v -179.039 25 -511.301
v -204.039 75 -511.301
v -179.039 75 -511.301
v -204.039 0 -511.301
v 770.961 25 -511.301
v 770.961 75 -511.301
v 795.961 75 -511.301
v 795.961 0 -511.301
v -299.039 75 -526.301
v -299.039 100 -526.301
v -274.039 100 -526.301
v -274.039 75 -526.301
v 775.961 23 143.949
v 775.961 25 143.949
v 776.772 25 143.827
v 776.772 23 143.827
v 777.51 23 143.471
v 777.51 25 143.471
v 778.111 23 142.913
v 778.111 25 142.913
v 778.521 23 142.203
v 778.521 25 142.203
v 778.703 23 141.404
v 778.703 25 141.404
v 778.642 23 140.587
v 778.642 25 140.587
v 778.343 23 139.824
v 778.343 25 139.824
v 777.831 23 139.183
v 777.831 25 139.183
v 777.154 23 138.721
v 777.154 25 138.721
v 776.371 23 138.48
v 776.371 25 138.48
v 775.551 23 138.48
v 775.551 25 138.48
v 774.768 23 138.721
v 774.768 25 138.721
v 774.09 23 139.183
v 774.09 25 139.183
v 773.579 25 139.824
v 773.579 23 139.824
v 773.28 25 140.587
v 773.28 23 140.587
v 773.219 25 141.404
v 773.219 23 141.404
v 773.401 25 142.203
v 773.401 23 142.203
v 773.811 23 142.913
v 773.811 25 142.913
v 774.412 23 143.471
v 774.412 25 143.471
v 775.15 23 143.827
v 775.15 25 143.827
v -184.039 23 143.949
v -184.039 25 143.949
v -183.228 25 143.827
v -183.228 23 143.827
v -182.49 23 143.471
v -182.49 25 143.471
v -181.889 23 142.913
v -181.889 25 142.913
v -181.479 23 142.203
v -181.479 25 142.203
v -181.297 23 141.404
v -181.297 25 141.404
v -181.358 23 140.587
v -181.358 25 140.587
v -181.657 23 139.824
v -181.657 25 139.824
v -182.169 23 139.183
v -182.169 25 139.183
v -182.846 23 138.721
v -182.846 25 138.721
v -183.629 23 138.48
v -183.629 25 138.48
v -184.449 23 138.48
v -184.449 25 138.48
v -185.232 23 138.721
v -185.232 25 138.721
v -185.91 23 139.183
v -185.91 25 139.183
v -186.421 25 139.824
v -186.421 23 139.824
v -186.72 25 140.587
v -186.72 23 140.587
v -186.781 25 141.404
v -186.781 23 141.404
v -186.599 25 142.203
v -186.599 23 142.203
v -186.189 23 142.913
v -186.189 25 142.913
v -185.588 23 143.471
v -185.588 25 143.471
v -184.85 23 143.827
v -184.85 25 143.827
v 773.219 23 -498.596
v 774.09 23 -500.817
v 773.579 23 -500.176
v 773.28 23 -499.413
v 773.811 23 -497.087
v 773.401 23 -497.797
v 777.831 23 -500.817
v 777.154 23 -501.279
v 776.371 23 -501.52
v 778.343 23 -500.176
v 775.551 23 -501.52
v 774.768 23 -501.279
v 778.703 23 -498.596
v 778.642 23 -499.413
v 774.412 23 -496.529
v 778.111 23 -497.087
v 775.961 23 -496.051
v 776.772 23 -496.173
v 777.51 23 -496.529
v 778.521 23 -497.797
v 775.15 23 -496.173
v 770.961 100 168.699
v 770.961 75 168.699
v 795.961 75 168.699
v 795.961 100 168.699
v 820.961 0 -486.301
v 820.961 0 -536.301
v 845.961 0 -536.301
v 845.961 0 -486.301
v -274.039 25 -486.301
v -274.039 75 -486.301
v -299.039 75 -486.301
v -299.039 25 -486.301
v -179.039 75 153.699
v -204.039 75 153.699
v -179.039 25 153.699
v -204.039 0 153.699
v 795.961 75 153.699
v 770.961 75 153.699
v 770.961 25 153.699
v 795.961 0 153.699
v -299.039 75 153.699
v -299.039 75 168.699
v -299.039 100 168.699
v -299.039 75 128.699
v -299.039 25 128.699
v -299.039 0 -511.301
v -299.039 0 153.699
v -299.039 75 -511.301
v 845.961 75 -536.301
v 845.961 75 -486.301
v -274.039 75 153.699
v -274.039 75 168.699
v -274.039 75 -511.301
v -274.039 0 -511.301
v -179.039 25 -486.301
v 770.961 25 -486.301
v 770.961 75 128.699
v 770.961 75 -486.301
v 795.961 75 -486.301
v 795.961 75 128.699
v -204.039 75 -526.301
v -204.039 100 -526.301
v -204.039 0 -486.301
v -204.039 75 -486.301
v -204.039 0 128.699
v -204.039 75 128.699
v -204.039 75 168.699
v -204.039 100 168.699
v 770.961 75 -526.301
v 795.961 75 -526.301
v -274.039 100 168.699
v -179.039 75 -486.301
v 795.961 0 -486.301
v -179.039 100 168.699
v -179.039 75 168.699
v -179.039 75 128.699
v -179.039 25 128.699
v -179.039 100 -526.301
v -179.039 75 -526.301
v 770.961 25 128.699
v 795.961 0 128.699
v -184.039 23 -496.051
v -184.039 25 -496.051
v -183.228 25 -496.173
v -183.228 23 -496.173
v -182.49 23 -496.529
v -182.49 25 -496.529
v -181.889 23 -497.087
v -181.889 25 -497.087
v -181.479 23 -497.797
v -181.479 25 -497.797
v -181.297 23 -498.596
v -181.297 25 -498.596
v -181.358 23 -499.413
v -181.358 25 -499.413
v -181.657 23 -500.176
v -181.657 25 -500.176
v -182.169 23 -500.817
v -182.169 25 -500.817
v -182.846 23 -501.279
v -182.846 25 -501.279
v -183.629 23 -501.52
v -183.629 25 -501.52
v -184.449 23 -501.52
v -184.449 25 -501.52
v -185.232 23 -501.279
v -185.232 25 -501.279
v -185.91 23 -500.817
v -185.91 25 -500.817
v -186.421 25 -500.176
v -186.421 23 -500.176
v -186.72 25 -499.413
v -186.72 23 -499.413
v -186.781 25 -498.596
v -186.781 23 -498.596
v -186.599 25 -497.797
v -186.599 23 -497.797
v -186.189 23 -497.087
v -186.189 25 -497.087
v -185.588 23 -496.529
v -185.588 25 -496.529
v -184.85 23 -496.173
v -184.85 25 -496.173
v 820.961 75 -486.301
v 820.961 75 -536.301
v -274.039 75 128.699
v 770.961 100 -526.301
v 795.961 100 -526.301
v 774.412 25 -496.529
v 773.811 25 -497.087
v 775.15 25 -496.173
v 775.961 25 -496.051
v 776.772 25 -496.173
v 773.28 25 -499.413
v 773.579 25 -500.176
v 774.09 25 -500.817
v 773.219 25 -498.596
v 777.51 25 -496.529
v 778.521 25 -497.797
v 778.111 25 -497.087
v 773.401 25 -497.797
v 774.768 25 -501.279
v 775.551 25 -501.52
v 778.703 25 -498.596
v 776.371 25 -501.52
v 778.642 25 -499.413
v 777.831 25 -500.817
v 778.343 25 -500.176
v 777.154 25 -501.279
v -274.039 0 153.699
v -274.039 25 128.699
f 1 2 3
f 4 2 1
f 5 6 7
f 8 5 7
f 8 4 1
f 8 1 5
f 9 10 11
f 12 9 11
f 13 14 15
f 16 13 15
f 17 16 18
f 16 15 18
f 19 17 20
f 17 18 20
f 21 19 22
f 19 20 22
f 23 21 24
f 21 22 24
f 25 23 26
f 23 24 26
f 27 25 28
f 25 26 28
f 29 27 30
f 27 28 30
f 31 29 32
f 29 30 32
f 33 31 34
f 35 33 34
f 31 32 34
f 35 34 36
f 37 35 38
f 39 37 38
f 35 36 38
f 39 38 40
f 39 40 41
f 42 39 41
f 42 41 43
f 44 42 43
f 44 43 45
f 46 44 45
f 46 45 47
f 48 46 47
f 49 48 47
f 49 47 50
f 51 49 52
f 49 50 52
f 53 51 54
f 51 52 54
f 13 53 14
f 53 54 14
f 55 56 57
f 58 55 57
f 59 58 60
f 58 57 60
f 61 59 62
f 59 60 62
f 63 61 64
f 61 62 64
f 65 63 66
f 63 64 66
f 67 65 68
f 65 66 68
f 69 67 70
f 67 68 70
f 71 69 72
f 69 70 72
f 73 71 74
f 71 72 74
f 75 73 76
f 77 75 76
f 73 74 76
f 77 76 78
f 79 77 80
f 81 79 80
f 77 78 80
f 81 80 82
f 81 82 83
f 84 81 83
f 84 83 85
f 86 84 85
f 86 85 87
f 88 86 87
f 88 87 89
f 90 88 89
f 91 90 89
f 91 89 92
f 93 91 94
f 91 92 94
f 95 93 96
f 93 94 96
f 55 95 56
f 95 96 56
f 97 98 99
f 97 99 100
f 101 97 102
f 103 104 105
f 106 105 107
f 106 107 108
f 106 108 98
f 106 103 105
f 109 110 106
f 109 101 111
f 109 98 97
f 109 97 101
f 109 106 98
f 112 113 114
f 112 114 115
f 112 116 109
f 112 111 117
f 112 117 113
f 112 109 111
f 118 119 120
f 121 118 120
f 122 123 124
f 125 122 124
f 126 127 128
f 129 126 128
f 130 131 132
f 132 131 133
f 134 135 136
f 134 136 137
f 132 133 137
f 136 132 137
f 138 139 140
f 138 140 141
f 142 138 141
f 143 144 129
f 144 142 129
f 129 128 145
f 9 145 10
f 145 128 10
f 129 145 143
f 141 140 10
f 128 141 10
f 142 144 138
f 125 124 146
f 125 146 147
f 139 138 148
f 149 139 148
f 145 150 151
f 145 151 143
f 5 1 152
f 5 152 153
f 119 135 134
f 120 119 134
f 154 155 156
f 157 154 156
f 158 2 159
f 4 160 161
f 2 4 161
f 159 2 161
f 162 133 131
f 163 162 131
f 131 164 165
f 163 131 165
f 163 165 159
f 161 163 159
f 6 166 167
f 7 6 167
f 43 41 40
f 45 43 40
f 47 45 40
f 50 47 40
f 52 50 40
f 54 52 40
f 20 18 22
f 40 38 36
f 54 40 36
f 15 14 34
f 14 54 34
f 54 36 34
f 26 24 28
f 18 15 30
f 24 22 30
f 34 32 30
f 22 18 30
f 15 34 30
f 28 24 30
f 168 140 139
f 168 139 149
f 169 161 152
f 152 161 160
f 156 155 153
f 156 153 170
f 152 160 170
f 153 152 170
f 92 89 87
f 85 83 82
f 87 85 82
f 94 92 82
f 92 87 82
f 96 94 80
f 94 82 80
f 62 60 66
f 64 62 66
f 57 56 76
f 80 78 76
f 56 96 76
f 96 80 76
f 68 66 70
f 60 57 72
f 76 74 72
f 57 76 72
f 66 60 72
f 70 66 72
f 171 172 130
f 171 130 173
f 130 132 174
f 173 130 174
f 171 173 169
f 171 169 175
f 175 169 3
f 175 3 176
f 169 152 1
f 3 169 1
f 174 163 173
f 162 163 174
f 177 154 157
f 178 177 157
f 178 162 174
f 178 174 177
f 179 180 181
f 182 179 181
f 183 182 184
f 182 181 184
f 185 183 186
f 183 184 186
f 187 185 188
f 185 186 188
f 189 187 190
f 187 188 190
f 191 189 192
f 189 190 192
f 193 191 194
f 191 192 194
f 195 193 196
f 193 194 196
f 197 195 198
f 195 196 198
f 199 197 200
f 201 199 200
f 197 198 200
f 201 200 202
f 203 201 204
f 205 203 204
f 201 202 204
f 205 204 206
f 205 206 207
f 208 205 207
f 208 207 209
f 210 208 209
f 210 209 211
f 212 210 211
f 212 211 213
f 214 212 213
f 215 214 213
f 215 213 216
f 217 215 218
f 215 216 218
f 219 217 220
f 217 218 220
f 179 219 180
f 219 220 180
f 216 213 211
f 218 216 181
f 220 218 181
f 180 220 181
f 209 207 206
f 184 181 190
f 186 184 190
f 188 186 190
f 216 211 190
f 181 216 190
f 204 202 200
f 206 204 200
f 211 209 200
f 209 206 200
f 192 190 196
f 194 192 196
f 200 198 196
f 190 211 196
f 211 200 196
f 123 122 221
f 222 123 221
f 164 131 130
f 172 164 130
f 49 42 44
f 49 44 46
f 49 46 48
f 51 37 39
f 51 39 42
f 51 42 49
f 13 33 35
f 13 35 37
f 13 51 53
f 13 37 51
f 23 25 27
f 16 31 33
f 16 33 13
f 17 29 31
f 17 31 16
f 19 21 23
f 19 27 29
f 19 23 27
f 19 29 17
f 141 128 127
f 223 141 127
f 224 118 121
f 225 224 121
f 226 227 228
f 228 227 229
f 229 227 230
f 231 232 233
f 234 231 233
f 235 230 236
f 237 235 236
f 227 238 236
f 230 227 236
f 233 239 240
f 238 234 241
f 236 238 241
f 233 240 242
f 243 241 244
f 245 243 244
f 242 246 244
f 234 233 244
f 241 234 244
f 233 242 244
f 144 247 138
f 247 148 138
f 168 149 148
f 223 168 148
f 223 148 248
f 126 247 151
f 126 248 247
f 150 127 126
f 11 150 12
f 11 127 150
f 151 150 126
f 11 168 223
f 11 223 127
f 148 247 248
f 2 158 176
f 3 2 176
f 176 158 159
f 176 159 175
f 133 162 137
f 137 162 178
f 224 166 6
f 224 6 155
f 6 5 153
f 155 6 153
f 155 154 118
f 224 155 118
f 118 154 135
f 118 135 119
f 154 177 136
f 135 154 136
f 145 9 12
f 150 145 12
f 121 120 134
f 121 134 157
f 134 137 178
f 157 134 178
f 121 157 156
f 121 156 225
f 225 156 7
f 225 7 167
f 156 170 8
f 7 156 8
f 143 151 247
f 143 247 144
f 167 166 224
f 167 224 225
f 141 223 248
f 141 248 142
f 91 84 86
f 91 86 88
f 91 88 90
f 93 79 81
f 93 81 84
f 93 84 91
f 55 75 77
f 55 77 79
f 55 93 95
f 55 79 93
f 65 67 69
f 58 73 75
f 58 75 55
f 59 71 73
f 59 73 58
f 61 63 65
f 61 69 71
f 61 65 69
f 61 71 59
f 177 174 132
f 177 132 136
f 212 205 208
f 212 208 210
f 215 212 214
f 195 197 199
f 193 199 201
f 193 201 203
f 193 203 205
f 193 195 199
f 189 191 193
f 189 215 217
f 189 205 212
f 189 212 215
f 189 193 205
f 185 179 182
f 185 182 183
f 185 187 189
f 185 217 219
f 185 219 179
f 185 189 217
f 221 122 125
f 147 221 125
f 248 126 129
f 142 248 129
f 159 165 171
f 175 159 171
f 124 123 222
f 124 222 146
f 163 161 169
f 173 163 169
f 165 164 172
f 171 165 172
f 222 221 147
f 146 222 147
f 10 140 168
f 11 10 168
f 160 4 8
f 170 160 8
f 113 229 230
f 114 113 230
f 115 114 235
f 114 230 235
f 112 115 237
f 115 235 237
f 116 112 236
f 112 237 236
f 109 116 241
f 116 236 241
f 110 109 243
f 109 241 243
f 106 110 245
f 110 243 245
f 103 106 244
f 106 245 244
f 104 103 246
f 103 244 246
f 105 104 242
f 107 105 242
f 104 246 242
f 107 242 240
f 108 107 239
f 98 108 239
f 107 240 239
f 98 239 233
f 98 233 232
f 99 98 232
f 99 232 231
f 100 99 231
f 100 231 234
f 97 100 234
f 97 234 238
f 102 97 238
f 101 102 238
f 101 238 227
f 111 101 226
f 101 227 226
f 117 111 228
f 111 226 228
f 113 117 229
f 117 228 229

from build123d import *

# Parameters (mm, degrees)
ESQUISSE1_W                  = 1000
ESQUISSE1_H                  = 25
ESQUISSE1_W_2                = 25
ESQUISSE1_H_2                = 665
BOSS_EXTRU_1_DEPTH           = 25
ESQUISSE2_R                  = 2.75
ENL_V_MAT_EXTRU_1_DEPTH      = 2
ESQUISSE4_W                  = 25
ESQUISSE4_H                  = 25
ESQUISSE4_W_2                = 50
ESQUISSE4_H_2                = 50
BOSS_EXTRU_3_DEPTH           = 75
ESQUISSE5_W                  = 25
ESQUISSE5_H                  = 20
ESQUISSE5_H_2                = 665
ESQUISSE5_H_3                = 25
ESQUISSE5_H_4                = 45
BOSS_EXTRU_4_DEPTH           = 25
ESQUISSE7_W                  = 615
ESQUISSE7_H                  = 25
ENL_V_MAT_EXTRU_2_DEPTH      = 1188
ESQUISSE8_W                  = 25
ESQUISSE8_H                  = 25
BOSS_EXTRU_7_DEPTH           = 50
ENL_V_MAT_EXTRU_3_DEPTH      = 216
ENL_V_MAT_EXTRU_3_DEPTH_BACK = 926
ESQUISSE9_W                  = 25
ESQUISSE9_H                  = 110.20058498
ESQUISSE9_H_2                = 152.237643614
ESQUISSE10_W                 = 25
ESQUISSE10_H                 = 640
ESQUISSE10_H_2               = 25
ESQUISSE10_H_3               = 15
ESQUISSE10_H_4               = 665
BOSS_EXTRU_8_DEPTH           = 25
ESQUISSE12_W                 = 25
ESQUISSE12_H                 = 695
BOSS_EXTRU_10_DEPTH          = 25
ESQUISSE13_W                 = 25
ESQUISSE13_H                 = 25
BOSS_EXTRU_11_DEPTH          = 50
ESQUISSE14_W                 = 25
ESQUISSE14_H                 = 665
BOSS_EXTRU_12_DEPTH          = 25


with BuildPart() as part:
    # Esquisse1 → Boss.-Extru.1 (new body)
    with BuildSketch(Plane(origin=(0, 0, 0), x_dir=(1, 0, 0), z_dir=(0, 1, 0))):
        with Locations((295.960935162, -141.198785334)):
            Rectangle(ESQUISSE1_W, ESQUISSE1_H)
        with Locations((295.960935162, 498.801214666)):
            Rectangle(ESQUISSE1_W, ESQUISSE1_H)
        with Locations((-216.539064838, 178.801214666)):
            Rectangle(ESQUISSE1_W_2, ESQUISSE1_H_2)
        with Locations((808.460935162, 178.801214666)):
            Rectangle(ESQUISSE1_W_2, ESQUISSE1_H_2)
    extrude(amount=BOSS_EXTRU_1_DEPTH)

    # Esquisse2 → Enlèv. mat.-Extru.1 (cut)
    with BuildSketch(Plane(origin=(0, 25, 0), x_dir=(1, 0, 0), z_dir=(0, 1, 0))):
        with Locations(Location((-184.039064838, -141.198785334, 0), (0, 0, 270))):
            Circle(ESQUISSE2_R)
        with Locations(Location((775.960935162, -141.198785334, 0), (0, 0, 270))):
            Circle(ESQUISSE2_R)
        with Locations(Location((775.960935162, 498.801214666, 0), (0, 0, 270))):
            Circle(ESQUISSE2_R)
        with Locations(Location((-184.039064838, 498.801214666, 0), (0, 0, 270))):
            Circle(ESQUISSE2_R)
    extrude(amount=-ENL_V_MAT_EXTRU_1_DEPTH, mode=Mode.SUBTRACT)

    # Esquisse4 → Boss.-Extru.3 (add)
    with BuildSketch(Plane.XZ):
        with Locations((808.460935162, 141.198785334)):
            Rectangle(ESQUISSE4_W, ESQUISSE4_H)
        with Locations((-216.539064838, 141.198785334)):
            Rectangle(ESQUISSE4_W, ESQUISSE4_H)
        with Locations((-216.539064838, -498.801214666)):
            Rectangle(ESQUISSE4_W, ESQUISSE4_H)
        with Locations((820.960935162, -511.301214666)):
            Rectangle(ESQUISSE4_W_2, ESQUISSE4_H_2)
    extrude(amount=-BOSS_EXTRU_3_DEPTH)

    # Esquisse5 → Boss.-Extru.4 (add)
    with BuildSketch(Plane(origin=(0, 75, 0), x_dir=(1, 0, 0), z_dir=(0, 1, 0))):
        with Locations((808.460935162, -163.698785334)):
            Rectangle(ESQUISSE5_W, ESQUISSE5_H)
        with Locations((808.460935162, 203.801214666)):
            Rectangle(ESQUISSE5_W, ESQUISSE5_H_2)
        with Locations((808.460935162, -141.198785334)):
            Rectangle(ESQUISSE5_W, ESQUISSE5_H_3)
        with Locations((808.460935162, 546.301214666)):
            Rectangle(ESQUISSE5_W, ESQUISSE5_H)
        with Locations((-216.539064838, 178.801214666)):
            Rectangle(ESQUISSE5_W, ESQUISSE5_H_2)
        with Locations((-216.539064838, -163.698785334)):
            Rectangle(ESQUISSE5_W, ESQUISSE5_H)
        with Locations((-216.539064838, 533.801214666)):
            Rectangle(ESQUISSE5_W, ESQUISSE5_H_4)
    extrude(amount=BOSS_EXTRU_4_DEPTH)

    # Esquisse7 → Enlèv. mat.-Extru.2 (cut)
    with BuildSketch(Plane.ZY.offset(229.039064838)):
        with Locations((-178.801214666, 12.5)):
            Rectangle(ESQUISSE7_W, ESQUISSE7_H)
    extrude(amount=-ENL_V_MAT_EXTRU_2_DEPTH, mode=Mode.SUBTRACT)

    # Esquisse8 → Boss.-Extru.7 (add)
    with BuildSketch(Plane(origin=(0, 25, 0), x_dir=(1, 0, 0), z_dir=(0, 1, 0))):
        with Locations((783.460935162, 498.801214666)):
            Rectangle(ESQUISSE8_W, ESQUISSE8_H)
        with Locations((783.460935162, -141.198785334)):
            Rectangle(ESQUISSE8_W, ESQUISSE8_H)
        with Locations((-191.539064838, -141.198785334)):
            Rectangle(ESQUISSE8_W, ESQUISSE8_H)
        with Locations((-191.539064838, 498.801214666)):
            Rectangle(ESQUISSE8_W, ESQUISSE8_H)
    extrude(amount=BOSS_EXTRU_7_DEPTH)

    # Esquisse9 → Enlèv. mat.-Extru.3 (cut, two sides: drawn at the far end of the back side and taken through both)
    with BuildSketch(Plane(origin=(0, 0, -511.301214666), x_dir=(-1, 0, 0), z_dir=(0, 0, -1)).offset(-ENL_V_MAT_EXTRU_3_DEPTH_BACK)):
        with Locations((-808.460935162, 55.10029249)):
            Rectangle(ESQUISSE9_W, ESQUISSE9_H)
        with Locations((216.539064838, 76.118821807)):
            Rectangle(ESQUISSE9_W, ESQUISSE9_H_2)
    extrude(amount=ENL_V_MAT_EXTRU_3_DEPTH + ENL_V_MAT_EXTRU_3_DEPTH_BACK, mode=Mode.SUBTRACT)


with BuildPart() as enl_v_mat_extru_3_piece_1:
    # of the separate pieces the step leaves, piece 1, a body of its own (enl_v_mat_extru_3_pieces)
    add(part.part.solids().sort_by_distance((-204.039064838, 75, -486.301214666))[0])



with BuildPart() as enl_v_mat_extru_3_piece_2:
    # of the separate pieces the step leaves, piece 2, a body of its own (enl_v_mat_extru_3_pieces)
    add(part.part.solids().sort_by_distance((-204.039064838, 0, 153.698785334))[0])


with BuildPart() as enl_v_mat_extru_3_piece_3:
    # of the separate pieces the step leaves, piece 3, a body of its own (enl_v_mat_extru_3_pieces)
    add(part.part.solids().sort_by_distance((820.960935162, 75, -486.301214666))[0])


with BuildPart() as enl_v_mat_extru_3_piece_1_1:
    add(enl_v_mat_extru_3_piece_1.part)

    add(enl_v_mat_extru_3_piece_2.part)  # Boss.-Extru.8 merges Enlèv. mat.-Extru.3 piece 2
    # Esquisse10 → Boss.-Extru.8 (add)
    with BuildSketch(Plane(origin=(0, 75, 0), x_dir=(1, 0, 0), z_dir=(0, 1, 0))):
        with Locations((783.460935162, 191.301214666)):
            Rectangle(ESQUISSE10_W, ESQUISSE10_H)
        with Locations((783.460935162, -141.198785334)):
            Rectangle(ESQUISSE10_W, ESQUISSE10_H_2)
        with Locations((783.460935162, -161.198785334)):
            Rectangle(ESQUISSE10_W, ESQUISSE10_H_3)
        with Locations((783.460935162, 518.801214666)):
            Rectangle(ESQUISSE10_W, ESQUISSE10_H_3)
        with Locations((-191.539064838, -161.198785334)):
            Rectangle(ESQUISSE10_W, ESQUISSE10_H_3)
        with Locations((-191.539064838, 178.801214666)):
            Rectangle(ESQUISSE10_W, ESQUISSE10_H_4)
        with Locations((-191.539064838, 518.801214666)):
            Rectangle(ESQUISSE10_W, ESQUISSE10_H_3)
    extrude(amount=BOSS_EXTRU_8_DEPTH)


with BuildPart() as body_3:
    # Esquisse12 → Boss.-Extru.10 (new body)
    with BuildSketch(Plane(origin=(0, 100, 0), x_dir=(1, 0, 0), z_dir=(0, 1, 0))):
        with Locations((-286.539064838, 178.801214666)):
            Rectangle(ESQUISSE12_W, ESQUISSE12_H)
    extrude(amount=-BOSS_EXTRU_10_DEPTH)

    # Esquisse13 → Boss.-Extru.11 (add)
    with BuildSketch(Plane(origin=(0, 75, 0), x_dir=(-1, 0, 0), z_dir=(0, -1, 0))):
        with Locations((286.539064838, 498.801214666)):
            Rectangle(ESQUISSE13_W, ESQUISSE13_H)
        with Locations((286.539064838, -141.198785334)):
            Rectangle(ESQUISSE13_W, ESQUISSE13_H)
    extrude(amount=BOSS_EXTRU_11_DEPTH)

    # Esquisse14 → Boss.-Extru.12 (add)
    with BuildSketch(Plane(origin=(0, 25, 0), x_dir=(-1, 0, 0), z_dir=(0, -1, 0))):
        with Locations((286.539064838, 178.801214666)):
            Rectangle(ESQUISSE14_W, ESQUISSE14_H)
    extrude(amount=BOSS_EXTRU_12_DEPTH)


solid = Compound([enl_v_mat_extru_3_piece_3.part, enl_v_mat_extru_3_piece_1_1.part, body_3.part])
